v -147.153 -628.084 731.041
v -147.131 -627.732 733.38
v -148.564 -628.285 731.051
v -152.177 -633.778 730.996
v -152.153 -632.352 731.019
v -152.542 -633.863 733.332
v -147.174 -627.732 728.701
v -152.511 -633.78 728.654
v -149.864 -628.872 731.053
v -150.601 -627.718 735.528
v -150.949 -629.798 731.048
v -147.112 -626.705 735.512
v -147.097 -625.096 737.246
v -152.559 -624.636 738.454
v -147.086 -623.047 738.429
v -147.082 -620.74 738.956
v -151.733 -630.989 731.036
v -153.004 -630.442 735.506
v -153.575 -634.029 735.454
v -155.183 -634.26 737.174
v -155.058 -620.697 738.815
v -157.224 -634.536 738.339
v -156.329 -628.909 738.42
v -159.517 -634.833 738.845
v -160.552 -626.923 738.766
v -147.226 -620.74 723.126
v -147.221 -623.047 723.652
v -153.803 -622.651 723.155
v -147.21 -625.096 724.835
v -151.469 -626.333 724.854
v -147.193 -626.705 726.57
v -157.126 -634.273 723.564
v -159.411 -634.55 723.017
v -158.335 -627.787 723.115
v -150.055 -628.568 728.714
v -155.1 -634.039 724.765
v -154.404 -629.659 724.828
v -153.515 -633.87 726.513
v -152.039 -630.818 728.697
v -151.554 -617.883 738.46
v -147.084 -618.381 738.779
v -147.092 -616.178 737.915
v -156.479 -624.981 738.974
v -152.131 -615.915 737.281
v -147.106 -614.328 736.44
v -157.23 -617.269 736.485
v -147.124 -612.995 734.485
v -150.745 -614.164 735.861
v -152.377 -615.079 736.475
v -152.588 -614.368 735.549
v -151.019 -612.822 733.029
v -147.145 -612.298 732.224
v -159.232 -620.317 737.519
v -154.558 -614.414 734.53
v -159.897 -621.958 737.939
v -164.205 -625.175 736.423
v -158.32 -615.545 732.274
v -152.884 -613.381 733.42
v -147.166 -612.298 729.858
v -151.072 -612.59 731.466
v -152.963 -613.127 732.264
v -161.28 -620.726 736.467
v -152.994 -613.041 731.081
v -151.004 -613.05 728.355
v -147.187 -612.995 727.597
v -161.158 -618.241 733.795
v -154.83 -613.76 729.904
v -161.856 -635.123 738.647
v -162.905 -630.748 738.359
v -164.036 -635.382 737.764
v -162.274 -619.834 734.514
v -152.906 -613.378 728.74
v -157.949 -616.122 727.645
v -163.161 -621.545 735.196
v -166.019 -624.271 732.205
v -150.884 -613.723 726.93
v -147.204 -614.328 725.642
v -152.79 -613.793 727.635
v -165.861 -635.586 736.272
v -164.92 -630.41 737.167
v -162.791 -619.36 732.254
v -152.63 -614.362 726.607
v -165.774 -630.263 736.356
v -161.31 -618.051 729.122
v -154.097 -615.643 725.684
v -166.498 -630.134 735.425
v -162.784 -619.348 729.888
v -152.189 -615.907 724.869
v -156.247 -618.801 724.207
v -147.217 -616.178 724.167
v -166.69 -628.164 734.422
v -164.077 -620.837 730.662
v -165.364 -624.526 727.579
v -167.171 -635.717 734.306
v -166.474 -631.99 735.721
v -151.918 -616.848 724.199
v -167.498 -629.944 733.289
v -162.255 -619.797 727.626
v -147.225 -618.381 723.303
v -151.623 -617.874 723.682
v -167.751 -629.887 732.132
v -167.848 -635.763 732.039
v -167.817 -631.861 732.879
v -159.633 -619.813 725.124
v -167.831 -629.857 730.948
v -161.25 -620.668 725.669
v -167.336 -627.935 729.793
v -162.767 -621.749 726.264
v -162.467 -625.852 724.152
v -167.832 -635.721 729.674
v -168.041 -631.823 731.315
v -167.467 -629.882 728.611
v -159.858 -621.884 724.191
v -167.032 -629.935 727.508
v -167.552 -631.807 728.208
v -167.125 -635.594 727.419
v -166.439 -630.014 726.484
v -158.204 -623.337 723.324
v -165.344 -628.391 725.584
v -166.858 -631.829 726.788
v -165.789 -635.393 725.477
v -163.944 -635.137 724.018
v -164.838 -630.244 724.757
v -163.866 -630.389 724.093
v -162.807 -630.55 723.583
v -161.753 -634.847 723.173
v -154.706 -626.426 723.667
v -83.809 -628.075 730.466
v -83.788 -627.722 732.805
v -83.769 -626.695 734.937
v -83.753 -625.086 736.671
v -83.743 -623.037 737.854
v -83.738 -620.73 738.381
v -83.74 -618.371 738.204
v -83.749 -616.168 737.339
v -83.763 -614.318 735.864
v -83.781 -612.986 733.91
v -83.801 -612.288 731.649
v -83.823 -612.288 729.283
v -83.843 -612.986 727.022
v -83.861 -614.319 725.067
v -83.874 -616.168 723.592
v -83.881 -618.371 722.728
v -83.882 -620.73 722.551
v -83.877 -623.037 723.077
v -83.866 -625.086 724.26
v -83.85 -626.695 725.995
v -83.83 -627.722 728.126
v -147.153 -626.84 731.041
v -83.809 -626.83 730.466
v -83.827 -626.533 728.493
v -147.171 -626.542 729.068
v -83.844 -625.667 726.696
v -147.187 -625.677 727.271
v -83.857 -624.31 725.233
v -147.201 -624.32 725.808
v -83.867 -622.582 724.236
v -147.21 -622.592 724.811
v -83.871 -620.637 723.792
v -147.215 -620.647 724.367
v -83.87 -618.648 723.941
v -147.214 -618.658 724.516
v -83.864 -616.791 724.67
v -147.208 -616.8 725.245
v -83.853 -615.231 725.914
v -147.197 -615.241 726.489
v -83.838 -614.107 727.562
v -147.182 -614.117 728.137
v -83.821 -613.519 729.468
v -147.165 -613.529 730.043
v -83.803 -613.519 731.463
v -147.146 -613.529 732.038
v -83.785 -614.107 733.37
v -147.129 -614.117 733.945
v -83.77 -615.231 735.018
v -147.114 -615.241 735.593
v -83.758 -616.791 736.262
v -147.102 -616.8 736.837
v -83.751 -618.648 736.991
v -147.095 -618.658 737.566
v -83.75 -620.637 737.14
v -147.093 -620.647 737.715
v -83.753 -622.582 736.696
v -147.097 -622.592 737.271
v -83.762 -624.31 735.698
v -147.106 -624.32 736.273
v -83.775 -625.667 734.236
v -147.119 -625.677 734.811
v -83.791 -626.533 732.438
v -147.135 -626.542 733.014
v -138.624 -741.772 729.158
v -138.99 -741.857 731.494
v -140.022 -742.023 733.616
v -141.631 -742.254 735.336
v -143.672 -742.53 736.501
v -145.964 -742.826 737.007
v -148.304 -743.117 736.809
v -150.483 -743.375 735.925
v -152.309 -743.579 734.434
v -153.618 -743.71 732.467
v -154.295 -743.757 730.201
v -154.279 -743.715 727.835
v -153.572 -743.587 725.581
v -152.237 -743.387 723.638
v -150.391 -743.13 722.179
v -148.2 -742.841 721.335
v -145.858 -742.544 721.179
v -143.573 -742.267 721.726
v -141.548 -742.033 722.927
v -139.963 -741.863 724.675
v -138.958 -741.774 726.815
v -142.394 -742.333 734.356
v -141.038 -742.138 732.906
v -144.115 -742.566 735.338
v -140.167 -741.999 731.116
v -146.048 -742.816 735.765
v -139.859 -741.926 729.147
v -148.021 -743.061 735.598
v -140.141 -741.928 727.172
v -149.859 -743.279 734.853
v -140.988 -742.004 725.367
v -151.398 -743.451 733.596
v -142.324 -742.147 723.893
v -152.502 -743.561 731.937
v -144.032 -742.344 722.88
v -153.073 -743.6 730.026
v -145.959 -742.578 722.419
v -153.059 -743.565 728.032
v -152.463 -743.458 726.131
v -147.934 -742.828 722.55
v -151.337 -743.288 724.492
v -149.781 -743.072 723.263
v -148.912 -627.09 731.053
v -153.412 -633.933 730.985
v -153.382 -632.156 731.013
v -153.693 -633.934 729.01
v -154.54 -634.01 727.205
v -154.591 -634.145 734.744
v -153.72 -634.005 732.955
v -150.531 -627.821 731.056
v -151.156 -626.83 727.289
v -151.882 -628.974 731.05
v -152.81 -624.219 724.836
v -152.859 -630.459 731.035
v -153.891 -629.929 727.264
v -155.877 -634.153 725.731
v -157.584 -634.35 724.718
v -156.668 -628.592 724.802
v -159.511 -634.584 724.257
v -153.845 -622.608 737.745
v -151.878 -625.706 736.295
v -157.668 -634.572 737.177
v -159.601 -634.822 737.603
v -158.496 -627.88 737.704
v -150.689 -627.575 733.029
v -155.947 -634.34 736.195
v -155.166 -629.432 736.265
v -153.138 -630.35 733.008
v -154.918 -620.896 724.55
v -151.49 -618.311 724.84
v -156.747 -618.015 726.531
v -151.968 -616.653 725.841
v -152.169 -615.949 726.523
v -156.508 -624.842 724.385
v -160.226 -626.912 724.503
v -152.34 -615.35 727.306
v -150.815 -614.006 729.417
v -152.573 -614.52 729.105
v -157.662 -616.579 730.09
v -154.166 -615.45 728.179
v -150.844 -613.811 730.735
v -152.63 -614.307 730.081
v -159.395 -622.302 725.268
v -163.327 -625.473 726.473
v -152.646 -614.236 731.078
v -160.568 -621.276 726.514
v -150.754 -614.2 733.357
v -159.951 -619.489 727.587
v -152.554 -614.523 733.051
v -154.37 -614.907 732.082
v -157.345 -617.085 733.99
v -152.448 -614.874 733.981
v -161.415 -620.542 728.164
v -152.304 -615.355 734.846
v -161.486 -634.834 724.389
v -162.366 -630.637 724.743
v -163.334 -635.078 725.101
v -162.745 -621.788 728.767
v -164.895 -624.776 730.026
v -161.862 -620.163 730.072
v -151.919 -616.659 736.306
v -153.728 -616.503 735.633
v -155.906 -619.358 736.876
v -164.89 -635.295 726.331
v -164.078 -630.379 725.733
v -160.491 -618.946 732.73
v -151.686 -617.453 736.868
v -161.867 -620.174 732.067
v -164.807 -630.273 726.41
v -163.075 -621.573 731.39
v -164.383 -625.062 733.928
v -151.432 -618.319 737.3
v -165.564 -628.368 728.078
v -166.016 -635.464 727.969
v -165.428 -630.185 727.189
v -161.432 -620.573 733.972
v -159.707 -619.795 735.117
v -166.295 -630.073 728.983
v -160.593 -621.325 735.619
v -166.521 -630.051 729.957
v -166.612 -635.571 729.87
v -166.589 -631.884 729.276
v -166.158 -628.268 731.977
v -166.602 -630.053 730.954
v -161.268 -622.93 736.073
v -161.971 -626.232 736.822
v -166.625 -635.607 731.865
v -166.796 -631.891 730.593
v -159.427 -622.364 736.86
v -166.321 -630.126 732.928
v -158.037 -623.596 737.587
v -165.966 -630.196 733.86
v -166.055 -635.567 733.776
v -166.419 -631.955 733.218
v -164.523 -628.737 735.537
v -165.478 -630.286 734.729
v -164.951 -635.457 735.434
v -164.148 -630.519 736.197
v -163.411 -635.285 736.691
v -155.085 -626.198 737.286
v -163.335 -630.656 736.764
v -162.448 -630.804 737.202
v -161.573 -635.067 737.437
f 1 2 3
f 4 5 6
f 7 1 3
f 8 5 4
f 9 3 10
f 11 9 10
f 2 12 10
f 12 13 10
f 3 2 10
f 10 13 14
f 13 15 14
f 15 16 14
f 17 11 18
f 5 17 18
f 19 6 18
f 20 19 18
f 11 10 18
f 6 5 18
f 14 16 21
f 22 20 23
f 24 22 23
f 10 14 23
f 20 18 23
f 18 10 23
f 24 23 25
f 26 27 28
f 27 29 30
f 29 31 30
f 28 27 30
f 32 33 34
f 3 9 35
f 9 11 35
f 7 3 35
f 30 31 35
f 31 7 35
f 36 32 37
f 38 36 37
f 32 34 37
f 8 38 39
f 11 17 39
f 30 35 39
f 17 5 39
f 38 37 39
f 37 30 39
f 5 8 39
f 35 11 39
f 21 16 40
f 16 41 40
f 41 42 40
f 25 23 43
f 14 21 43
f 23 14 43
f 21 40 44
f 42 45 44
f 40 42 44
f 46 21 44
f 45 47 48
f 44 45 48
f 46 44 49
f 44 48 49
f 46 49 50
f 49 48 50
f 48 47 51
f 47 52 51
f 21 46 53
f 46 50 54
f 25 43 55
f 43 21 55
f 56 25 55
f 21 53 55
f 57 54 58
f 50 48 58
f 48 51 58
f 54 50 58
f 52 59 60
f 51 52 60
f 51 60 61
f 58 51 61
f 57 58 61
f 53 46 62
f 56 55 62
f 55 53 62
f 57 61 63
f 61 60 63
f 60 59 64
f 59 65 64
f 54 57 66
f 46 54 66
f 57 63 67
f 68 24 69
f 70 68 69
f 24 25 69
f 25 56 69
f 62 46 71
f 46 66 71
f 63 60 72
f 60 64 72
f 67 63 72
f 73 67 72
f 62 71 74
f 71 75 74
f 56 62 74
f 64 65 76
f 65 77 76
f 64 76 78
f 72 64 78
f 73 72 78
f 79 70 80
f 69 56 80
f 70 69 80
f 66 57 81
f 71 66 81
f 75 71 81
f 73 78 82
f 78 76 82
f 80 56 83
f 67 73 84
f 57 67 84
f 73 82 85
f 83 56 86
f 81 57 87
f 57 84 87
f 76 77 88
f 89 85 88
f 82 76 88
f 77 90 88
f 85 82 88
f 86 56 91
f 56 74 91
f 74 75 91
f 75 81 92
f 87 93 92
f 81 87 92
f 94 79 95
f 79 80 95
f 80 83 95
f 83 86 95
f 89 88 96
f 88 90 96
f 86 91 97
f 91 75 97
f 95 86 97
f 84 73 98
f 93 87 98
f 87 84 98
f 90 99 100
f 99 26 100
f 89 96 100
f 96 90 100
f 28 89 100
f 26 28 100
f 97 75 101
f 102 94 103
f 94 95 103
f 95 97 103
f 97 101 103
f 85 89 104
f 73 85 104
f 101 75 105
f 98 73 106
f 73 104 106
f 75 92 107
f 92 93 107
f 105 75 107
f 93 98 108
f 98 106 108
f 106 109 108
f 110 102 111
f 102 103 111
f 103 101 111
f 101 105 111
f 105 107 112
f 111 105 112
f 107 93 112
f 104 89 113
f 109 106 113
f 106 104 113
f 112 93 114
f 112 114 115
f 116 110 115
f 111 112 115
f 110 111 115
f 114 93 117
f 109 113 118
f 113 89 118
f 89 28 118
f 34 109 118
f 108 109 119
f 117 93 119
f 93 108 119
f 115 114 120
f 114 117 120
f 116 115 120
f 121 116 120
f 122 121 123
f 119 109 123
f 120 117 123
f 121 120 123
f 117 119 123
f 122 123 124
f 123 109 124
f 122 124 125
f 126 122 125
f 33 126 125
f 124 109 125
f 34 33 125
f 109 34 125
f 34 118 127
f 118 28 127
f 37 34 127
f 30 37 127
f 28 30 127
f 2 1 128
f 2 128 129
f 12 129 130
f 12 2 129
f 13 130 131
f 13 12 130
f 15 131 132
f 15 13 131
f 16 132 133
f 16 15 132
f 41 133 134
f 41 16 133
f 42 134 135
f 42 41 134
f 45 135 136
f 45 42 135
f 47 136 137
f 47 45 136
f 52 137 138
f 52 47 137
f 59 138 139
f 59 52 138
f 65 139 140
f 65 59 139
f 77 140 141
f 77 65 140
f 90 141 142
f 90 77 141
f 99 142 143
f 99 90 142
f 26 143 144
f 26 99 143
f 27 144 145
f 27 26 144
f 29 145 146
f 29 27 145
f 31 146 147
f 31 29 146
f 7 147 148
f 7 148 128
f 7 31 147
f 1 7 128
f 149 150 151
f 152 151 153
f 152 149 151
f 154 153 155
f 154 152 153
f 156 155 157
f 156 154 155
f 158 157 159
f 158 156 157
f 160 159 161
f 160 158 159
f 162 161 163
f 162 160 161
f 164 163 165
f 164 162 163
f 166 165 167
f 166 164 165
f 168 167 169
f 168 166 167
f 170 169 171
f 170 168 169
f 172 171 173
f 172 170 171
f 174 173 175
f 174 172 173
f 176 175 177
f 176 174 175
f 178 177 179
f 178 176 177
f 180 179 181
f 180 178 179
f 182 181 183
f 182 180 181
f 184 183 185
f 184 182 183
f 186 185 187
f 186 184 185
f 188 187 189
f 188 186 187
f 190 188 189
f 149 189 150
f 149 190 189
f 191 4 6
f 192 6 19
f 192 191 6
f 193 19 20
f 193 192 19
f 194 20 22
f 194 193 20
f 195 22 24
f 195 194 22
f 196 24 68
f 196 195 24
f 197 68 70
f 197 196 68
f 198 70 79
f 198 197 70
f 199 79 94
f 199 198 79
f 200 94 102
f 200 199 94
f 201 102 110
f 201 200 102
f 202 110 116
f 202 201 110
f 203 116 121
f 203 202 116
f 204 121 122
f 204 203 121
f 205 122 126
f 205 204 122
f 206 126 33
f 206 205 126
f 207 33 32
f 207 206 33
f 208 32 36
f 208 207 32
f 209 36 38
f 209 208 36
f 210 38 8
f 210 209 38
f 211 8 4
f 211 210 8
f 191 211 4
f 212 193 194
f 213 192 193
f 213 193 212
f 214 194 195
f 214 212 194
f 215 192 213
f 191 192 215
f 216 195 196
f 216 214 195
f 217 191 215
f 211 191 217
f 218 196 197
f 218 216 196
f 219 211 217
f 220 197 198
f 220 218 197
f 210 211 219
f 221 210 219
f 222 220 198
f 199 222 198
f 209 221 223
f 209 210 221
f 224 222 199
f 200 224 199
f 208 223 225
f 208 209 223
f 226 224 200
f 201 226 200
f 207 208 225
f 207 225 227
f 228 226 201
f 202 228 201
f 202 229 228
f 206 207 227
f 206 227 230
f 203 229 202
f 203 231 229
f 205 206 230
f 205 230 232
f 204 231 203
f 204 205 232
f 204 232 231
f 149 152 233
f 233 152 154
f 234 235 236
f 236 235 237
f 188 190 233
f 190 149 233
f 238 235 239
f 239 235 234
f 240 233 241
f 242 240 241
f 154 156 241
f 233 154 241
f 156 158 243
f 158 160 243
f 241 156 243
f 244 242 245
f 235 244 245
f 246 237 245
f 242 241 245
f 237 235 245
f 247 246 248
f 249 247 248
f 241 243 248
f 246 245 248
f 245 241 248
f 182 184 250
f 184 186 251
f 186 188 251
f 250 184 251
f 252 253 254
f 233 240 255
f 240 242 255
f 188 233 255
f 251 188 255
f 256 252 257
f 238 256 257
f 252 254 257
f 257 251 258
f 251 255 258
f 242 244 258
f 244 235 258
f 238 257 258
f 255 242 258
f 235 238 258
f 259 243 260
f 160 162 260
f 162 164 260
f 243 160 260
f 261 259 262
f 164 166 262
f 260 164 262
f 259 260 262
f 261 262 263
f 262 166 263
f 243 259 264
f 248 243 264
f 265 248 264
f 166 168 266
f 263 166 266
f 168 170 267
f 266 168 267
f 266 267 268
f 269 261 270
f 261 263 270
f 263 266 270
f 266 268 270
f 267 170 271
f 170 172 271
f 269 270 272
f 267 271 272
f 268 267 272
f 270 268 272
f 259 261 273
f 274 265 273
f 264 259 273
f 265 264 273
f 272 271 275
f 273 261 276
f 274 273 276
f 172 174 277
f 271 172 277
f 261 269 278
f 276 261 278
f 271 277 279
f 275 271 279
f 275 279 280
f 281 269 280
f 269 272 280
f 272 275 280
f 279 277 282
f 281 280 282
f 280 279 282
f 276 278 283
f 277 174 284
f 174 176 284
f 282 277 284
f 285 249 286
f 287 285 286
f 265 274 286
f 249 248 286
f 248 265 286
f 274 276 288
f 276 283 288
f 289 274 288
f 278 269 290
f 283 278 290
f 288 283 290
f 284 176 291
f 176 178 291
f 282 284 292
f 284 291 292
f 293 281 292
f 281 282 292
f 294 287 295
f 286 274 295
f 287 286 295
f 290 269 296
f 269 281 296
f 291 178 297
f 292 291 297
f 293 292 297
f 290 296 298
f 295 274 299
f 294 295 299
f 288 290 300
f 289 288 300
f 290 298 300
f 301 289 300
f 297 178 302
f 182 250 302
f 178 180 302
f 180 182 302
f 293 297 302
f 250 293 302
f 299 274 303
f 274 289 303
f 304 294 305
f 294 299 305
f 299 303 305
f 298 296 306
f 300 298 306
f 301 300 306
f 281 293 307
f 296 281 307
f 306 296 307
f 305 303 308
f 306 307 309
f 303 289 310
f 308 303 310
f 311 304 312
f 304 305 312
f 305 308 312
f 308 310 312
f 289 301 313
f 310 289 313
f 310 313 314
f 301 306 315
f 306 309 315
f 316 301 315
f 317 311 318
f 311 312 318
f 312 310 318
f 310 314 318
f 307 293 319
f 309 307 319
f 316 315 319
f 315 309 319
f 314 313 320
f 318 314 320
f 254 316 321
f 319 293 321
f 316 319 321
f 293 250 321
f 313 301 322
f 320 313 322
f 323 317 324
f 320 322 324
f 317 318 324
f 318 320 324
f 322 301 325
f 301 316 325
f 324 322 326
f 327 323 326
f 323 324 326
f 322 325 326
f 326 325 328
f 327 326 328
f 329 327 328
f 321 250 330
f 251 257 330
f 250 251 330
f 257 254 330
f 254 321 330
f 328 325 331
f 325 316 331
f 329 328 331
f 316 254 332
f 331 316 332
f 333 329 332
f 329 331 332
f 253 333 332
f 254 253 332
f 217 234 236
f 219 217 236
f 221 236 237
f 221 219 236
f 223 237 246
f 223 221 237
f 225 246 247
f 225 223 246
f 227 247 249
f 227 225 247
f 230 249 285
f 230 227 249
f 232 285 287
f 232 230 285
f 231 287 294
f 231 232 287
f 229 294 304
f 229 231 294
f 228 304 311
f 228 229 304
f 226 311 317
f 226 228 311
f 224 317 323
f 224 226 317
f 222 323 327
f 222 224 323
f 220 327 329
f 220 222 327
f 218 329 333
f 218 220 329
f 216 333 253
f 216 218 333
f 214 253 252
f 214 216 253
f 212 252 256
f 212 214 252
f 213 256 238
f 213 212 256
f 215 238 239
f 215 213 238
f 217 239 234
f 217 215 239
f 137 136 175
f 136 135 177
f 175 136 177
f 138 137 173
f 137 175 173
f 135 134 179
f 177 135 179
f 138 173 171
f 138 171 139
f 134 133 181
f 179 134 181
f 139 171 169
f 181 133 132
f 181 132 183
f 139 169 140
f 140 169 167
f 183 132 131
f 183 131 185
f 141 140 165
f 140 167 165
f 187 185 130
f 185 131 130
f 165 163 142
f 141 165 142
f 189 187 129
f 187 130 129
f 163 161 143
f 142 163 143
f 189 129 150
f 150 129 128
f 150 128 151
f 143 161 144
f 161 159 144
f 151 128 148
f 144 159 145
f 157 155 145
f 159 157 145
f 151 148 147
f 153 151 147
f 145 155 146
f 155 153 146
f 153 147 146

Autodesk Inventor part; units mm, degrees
ref_plane "YZ Plane" through (0, 0, 0) normal (1, 0, 0) x (0, 1, 0)
ref_plane "XZ Plane" through (0, 0, 0) normal (0, 1, 0) x (-1, 0, 0)
ref_plane "Work Plane5" through (-83.8105, -620.1371, 730.4657) normal (-1, -0.0002, 0.0091) x (0.0002, -1, 0)
sketch "Sketch7" plane through (-83.8105, -620.1371, 730.4657) normal (-1, -0.0002, 0.0091) x (0.0002, -1, 0)
  circle A0 centre (0, 0) radius 7.9375
  circle A1 centre (0, 0) radius 6.6929
sketch3d "3D Sketch5"
  line L0 (-83.8105, -620.1371, 730.4657) -> (-147.1541, -620.1469, 731.0409)
  arc A0 (-147.1541, -620.1469, 731.0409) -> (-160.0522, -634.7654, 730.9259) centre (-147.154, -633.1452, 730.8345) ccw
  line L1 (-160.0522, -634.7654, 730.9259) -> (-146.4996, -742.7591, 729.0874)
  dimension "d16" = 12.9999
sweep "Sweep5" add profiles "Sketch7" path "3D Sketch5"
equation "\"OD\" = 15.875"
equation "\"t\" = 1.2446"
equation "\"L\" = PL"
equation "\"ID\" = 13.3858"
equation "\"PL\" = 194.2338"
equation "\"Size_Designation\" = 1.2345"
properties material "Copper"
